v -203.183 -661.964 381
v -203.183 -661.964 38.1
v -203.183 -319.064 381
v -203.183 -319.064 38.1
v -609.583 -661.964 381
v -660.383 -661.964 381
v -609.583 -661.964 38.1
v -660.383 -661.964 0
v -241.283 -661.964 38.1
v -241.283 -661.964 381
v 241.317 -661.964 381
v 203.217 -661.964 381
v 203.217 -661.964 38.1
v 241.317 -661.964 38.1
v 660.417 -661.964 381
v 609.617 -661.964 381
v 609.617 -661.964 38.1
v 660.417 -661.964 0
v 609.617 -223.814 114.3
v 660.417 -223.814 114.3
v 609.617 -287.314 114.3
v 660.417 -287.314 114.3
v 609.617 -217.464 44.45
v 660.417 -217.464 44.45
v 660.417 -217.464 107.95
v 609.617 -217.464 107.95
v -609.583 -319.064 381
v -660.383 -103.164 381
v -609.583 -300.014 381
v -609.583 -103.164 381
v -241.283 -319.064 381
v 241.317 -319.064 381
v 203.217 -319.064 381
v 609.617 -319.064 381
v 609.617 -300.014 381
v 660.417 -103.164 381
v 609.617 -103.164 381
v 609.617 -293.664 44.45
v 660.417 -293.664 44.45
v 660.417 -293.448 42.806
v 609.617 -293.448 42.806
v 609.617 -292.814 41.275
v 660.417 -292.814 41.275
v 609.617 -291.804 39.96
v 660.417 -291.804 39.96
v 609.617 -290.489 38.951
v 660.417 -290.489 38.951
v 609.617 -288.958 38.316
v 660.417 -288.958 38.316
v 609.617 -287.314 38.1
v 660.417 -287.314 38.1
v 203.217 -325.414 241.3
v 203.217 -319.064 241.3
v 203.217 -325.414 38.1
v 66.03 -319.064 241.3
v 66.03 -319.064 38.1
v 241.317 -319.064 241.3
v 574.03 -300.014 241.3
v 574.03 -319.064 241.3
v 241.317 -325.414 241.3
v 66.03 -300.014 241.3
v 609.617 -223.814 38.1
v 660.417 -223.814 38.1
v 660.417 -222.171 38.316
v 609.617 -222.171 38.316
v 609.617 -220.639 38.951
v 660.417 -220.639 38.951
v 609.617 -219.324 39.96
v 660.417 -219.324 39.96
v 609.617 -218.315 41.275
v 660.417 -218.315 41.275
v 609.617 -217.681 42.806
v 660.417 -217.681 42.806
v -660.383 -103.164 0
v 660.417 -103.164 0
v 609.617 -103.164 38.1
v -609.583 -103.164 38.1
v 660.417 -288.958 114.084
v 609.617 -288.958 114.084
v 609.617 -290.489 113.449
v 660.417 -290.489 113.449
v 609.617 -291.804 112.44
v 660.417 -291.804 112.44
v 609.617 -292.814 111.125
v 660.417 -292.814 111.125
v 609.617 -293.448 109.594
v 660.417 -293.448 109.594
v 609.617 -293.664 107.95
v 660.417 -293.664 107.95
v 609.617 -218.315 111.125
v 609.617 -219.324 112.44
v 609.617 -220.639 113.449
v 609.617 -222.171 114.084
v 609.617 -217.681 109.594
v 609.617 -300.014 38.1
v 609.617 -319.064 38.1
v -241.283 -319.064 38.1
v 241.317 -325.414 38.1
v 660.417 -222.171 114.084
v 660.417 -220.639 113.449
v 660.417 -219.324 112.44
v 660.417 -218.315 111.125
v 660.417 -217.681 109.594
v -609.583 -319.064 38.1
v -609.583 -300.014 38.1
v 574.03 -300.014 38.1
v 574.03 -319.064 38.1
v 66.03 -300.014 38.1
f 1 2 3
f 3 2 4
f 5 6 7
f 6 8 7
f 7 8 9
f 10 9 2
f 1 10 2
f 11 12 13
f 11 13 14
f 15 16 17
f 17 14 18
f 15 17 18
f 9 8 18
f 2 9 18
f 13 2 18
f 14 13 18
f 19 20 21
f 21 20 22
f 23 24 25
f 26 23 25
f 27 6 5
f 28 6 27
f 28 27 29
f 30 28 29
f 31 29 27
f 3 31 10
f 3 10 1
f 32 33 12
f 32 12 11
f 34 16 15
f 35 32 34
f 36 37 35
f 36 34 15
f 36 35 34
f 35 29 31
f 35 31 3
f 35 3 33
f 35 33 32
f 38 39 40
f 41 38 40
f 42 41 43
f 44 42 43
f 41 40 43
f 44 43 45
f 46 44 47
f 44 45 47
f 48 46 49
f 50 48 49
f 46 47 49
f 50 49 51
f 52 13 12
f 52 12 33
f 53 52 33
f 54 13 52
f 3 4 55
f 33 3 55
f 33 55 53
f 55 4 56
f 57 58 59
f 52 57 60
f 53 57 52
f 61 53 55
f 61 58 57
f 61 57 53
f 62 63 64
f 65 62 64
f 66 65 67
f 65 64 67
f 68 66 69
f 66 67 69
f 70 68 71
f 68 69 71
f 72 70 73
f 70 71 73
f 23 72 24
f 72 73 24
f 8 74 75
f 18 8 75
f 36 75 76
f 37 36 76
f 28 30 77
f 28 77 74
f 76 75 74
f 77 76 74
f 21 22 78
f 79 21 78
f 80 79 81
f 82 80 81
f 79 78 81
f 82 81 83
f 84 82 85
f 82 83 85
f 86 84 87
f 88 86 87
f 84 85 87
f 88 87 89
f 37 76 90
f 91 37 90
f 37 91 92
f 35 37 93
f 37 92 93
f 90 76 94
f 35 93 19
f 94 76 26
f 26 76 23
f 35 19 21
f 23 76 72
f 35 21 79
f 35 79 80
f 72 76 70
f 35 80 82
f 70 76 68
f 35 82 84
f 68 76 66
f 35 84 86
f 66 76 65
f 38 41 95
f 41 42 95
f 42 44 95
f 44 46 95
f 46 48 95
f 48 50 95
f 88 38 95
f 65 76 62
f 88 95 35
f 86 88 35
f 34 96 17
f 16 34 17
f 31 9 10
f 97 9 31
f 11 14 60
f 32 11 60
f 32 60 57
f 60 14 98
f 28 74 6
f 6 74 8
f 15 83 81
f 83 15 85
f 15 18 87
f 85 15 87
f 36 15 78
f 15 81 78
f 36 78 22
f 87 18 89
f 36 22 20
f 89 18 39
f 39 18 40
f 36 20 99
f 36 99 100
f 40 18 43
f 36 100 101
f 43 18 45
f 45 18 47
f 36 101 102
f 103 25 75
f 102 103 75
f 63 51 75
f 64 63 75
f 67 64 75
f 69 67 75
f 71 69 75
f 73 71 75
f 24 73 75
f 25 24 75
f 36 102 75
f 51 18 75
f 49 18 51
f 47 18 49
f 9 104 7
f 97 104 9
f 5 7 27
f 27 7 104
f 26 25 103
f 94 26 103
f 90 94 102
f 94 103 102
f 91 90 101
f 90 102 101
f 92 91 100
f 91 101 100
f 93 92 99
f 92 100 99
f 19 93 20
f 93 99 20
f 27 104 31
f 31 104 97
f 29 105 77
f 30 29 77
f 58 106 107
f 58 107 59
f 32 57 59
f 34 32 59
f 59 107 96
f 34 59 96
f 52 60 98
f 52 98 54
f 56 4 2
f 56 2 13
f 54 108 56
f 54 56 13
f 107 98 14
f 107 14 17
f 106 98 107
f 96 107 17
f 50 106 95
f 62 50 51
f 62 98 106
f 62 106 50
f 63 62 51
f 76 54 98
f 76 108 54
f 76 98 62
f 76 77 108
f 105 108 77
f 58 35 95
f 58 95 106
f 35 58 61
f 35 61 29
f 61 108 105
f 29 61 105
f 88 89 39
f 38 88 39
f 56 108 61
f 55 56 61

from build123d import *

# Parameters (mm, degrees)
F0_W     = 1320.8
F0_H     = 558.8
F1_DEPTH = 38.1
F2_W     = 38.1
F2_H     = 342.9
F3_DEPTH = 342.9
F5_DEPTH = 148.844
F6_W     = 508
F6_H     = 203.2
F7_DEPTH = 25.4


with BuildPart() as f1:
    # F0 (on Top) → F1 (new body)
    with BuildSketch(Plane.XY):
        with Locations((0.016812, -382.564251)):
            Rectangle(F0_W, F0_H)
    extrude(amount=F1_DEPTH)

    # F2 (on face) → F3 (join)
    with BuildSketch(Plane.XY.offset(38.1)):
        Polygon((-609.583188, -103.164251), (-660.383188, -103.164251), (-660.383188, -661.964251), (-609.583188, -661.964251), (-609.583188, -319.064251), (-609.583188, -300.014251), align=None)
        Polygon((609.616812, -300.014251), (-609.583188, -300.014251), (-609.583188, -319.064251), (-241.283188, -319.064251), (-203.183188, -319.064251), (203.216812, -319.064251), (241.316812, -319.064251), (609.616812, -319.064251), align=None)
        Polygon((609.616812, -103.164251), (609.616812, -300.014251), (609.616812, -319.064251), (609.616812, -661.964251), (660.416812, -661.964251), (660.416812, -103.164251), align=None)
        with Locations((-222.233188, -490.514251)):
            Rectangle(F2_W, F2_H)
        with Locations((222.266812, -490.514251)):
            Rectangle(F2_W, F2_H)
    extrude(amount=F3_DEPTH)

    # F4 (on face) → F5 (cut)
    with BuildSketch(Plane.YZ.offset(660.416812)):
        with BuildLine():
            Line((-223.814251, 114.3), (-287.314251, 114.3))
            ThreePointArc((-287.314251, 114.3), (-291.804379, 112.440128), (-293.664251, 107.95))
            Line((-293.664251, 107.95), (-293.664251, 44.45))
            ThreePointArc((-293.664251, 44.45), (-291.804379, 39.959872), (-287.314251, 38.1))
            Line((-287.314251, 38.1), (-223.814251, 38.1))
            ThreePointArc((-223.814251, 38.1), (-219.324123, 39.959872), (-217.464251, 44.45))
            Line((-217.464251, 44.45), (-217.464251, 107.95))
            ThreePointArc((-217.464251, 107.95), (-219.324123, 112.440128), (-223.814251, 114.3))
        make_face()
    extrude(amount=-F5_DEPTH, mode=Mode.SUBTRACT)

    # F6 (on face) → F7 (cut)
    with BuildSketch(Plane(origin=(0, -300.014251, 0), x_dir=(-1, 0, 0), z_dir=(0, 1, 0))):
        with Locations((-320.029565, 139.7)):
            Rectangle(F6_W, F6_H)
    extrude(amount=-F7_DEPTH, mode=Mode.SUBTRACT)


solid = f1.part
